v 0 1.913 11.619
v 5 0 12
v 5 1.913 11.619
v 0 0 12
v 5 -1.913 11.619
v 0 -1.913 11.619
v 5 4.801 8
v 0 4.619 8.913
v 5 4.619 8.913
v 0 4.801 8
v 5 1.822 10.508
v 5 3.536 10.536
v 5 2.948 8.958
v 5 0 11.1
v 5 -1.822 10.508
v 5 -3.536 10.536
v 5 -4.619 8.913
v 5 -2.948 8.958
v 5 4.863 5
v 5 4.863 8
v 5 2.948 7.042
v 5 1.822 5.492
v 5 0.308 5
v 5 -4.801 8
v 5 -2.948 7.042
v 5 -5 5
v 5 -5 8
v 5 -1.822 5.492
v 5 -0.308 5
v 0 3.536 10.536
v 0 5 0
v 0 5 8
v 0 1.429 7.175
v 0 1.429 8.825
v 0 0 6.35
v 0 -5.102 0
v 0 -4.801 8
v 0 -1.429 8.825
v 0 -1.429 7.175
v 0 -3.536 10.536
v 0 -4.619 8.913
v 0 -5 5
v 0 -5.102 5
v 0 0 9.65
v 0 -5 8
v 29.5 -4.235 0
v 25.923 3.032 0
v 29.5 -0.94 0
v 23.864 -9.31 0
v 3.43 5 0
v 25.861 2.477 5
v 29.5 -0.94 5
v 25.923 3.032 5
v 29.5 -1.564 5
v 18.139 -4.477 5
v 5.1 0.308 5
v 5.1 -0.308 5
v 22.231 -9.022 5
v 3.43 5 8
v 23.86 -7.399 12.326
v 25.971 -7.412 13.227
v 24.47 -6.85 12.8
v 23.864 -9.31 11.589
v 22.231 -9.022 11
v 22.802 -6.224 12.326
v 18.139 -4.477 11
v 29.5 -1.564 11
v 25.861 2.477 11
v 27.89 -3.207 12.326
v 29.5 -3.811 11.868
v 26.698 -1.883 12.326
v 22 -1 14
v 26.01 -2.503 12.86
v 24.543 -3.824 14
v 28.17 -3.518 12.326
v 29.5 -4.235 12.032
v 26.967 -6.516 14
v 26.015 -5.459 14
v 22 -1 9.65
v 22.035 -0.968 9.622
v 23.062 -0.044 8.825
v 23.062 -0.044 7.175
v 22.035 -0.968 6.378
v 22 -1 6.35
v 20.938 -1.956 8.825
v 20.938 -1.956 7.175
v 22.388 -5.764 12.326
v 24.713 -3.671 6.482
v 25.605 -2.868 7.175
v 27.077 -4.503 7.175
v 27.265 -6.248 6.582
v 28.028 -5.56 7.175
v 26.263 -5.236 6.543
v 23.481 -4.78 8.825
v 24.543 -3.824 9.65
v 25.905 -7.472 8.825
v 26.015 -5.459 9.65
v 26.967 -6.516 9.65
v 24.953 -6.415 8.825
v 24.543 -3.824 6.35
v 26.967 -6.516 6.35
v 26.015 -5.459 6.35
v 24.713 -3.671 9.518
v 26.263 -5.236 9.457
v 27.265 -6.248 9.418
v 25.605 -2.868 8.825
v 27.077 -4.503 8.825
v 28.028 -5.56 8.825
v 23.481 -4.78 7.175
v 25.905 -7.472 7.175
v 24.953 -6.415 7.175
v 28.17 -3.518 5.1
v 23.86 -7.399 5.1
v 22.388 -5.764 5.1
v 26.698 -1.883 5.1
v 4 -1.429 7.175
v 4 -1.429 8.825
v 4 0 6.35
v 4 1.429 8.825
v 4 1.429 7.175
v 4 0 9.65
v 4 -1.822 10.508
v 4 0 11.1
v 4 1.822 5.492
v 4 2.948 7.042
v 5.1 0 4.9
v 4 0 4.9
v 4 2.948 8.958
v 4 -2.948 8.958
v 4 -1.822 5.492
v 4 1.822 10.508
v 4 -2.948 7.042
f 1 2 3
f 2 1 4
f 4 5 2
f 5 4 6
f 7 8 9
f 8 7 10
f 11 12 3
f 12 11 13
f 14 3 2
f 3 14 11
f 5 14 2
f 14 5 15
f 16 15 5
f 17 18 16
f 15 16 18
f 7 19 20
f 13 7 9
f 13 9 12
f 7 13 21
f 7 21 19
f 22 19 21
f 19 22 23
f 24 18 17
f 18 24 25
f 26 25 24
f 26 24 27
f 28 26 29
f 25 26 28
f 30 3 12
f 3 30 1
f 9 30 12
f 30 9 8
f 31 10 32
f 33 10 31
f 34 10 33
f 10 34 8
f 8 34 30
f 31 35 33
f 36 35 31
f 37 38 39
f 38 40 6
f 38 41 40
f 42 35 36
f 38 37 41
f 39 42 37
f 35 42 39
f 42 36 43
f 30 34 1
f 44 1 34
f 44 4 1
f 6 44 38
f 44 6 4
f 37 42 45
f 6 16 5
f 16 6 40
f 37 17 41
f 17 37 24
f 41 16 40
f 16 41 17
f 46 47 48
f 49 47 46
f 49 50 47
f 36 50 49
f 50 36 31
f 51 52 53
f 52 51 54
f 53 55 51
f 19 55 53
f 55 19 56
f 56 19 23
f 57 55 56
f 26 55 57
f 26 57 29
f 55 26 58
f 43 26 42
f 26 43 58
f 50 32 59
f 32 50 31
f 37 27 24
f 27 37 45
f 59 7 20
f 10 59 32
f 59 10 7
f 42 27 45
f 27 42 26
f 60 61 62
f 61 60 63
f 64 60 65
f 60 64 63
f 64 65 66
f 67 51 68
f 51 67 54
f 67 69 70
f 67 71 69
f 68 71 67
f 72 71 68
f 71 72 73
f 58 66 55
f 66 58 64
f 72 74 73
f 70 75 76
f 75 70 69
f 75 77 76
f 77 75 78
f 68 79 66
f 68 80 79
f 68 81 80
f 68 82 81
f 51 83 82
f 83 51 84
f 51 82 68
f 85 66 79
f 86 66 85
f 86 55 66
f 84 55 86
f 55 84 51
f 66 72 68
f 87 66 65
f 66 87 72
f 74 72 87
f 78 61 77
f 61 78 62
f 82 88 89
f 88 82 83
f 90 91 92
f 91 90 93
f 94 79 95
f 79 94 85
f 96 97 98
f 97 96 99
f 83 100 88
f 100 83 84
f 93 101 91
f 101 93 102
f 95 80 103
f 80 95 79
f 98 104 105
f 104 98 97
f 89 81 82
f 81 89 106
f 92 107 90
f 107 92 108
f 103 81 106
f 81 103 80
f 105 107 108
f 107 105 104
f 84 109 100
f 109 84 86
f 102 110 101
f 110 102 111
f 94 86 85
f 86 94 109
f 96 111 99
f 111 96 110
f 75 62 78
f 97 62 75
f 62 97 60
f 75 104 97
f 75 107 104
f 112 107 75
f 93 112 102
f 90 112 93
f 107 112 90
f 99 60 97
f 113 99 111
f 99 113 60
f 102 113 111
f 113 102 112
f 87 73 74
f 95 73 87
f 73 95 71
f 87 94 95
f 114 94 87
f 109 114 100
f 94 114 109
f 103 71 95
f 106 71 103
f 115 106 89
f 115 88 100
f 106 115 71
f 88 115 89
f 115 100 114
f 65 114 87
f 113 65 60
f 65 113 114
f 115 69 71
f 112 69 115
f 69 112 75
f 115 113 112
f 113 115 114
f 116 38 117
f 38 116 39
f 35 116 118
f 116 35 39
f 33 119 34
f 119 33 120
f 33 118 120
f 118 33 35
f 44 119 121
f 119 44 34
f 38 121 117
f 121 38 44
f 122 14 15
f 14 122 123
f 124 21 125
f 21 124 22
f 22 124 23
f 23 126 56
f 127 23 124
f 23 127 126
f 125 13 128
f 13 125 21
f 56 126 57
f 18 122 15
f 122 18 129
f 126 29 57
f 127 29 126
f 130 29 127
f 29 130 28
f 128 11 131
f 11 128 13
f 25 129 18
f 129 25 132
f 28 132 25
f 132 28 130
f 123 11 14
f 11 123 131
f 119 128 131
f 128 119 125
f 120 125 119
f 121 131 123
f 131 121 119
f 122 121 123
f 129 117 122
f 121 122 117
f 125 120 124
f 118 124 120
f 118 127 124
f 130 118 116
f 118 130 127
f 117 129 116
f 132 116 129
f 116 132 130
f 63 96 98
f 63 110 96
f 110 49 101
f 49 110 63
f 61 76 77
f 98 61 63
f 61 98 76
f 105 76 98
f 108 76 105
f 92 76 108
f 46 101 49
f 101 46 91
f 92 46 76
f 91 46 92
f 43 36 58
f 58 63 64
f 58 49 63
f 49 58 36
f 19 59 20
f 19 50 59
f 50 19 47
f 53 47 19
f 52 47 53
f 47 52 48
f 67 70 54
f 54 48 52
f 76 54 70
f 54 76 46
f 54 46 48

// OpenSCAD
// PIRANHA iteration1
// LCD cover
// GNU GPL v3
// Usan Siriwardana <usiriwar@uwaterloo.ca> and contributors
// based on Prusa i3 MK3S
// https://reprap.org/wiki/Prusa_i3_MK3

translate([0, 0, 8])rotate([0, 90, 0])difference(){
	// base
    union(){
        translate([1,  0,0]) rotate([0,0,0])cylinder(h = 5, r=5);
        translate([3,-10,0]) rotate([0,0,0]) cube([5,15,30]);
        translate([0, -5,0]) rotate([0,0,0]) cube([8,10,5]);
        translate([0, -1,22]) rotate([48,0,0])cylinder(h = 10, r=6, $fn=6);
	}
	
	
    translate([0,-1,22]) rotate([48,0,0])translate([0, 0, -1])cylinder(h = 30, r=1.65);
        
	// square nut slot
    translate([0, -1,22]) rotate([48,0,0])translate([-5, 0, 4.9])cube([15.8, 5.8, 2.2], center = true);
   
   	// conterbored bolt hole
    translate([0,0,-13]) rotate([0,0,0])cylinder(h = 25, r=1.65);
    translate([0,0,4]) rotate([0,0,0])cylinder(h = 1.1, r=3.1);
    
    // trim to size
    translate([15, -38,-8]) rotate([0,-48,90]) cube([60,50,20]);
    translate([-10,-24,-8]) rotate([10,0,0]) cube([50,20,40]);
    translate([-10,  6,-8]) rotate([5,0,0]) cube([50,20,40]);
    translate([-10,8.5,21]) rotate([48,0,0]) cube([20,20,20]);
    translate([-10,-13,29.5]) rotate([0,0,0]) cube([20,20,20]);
}
